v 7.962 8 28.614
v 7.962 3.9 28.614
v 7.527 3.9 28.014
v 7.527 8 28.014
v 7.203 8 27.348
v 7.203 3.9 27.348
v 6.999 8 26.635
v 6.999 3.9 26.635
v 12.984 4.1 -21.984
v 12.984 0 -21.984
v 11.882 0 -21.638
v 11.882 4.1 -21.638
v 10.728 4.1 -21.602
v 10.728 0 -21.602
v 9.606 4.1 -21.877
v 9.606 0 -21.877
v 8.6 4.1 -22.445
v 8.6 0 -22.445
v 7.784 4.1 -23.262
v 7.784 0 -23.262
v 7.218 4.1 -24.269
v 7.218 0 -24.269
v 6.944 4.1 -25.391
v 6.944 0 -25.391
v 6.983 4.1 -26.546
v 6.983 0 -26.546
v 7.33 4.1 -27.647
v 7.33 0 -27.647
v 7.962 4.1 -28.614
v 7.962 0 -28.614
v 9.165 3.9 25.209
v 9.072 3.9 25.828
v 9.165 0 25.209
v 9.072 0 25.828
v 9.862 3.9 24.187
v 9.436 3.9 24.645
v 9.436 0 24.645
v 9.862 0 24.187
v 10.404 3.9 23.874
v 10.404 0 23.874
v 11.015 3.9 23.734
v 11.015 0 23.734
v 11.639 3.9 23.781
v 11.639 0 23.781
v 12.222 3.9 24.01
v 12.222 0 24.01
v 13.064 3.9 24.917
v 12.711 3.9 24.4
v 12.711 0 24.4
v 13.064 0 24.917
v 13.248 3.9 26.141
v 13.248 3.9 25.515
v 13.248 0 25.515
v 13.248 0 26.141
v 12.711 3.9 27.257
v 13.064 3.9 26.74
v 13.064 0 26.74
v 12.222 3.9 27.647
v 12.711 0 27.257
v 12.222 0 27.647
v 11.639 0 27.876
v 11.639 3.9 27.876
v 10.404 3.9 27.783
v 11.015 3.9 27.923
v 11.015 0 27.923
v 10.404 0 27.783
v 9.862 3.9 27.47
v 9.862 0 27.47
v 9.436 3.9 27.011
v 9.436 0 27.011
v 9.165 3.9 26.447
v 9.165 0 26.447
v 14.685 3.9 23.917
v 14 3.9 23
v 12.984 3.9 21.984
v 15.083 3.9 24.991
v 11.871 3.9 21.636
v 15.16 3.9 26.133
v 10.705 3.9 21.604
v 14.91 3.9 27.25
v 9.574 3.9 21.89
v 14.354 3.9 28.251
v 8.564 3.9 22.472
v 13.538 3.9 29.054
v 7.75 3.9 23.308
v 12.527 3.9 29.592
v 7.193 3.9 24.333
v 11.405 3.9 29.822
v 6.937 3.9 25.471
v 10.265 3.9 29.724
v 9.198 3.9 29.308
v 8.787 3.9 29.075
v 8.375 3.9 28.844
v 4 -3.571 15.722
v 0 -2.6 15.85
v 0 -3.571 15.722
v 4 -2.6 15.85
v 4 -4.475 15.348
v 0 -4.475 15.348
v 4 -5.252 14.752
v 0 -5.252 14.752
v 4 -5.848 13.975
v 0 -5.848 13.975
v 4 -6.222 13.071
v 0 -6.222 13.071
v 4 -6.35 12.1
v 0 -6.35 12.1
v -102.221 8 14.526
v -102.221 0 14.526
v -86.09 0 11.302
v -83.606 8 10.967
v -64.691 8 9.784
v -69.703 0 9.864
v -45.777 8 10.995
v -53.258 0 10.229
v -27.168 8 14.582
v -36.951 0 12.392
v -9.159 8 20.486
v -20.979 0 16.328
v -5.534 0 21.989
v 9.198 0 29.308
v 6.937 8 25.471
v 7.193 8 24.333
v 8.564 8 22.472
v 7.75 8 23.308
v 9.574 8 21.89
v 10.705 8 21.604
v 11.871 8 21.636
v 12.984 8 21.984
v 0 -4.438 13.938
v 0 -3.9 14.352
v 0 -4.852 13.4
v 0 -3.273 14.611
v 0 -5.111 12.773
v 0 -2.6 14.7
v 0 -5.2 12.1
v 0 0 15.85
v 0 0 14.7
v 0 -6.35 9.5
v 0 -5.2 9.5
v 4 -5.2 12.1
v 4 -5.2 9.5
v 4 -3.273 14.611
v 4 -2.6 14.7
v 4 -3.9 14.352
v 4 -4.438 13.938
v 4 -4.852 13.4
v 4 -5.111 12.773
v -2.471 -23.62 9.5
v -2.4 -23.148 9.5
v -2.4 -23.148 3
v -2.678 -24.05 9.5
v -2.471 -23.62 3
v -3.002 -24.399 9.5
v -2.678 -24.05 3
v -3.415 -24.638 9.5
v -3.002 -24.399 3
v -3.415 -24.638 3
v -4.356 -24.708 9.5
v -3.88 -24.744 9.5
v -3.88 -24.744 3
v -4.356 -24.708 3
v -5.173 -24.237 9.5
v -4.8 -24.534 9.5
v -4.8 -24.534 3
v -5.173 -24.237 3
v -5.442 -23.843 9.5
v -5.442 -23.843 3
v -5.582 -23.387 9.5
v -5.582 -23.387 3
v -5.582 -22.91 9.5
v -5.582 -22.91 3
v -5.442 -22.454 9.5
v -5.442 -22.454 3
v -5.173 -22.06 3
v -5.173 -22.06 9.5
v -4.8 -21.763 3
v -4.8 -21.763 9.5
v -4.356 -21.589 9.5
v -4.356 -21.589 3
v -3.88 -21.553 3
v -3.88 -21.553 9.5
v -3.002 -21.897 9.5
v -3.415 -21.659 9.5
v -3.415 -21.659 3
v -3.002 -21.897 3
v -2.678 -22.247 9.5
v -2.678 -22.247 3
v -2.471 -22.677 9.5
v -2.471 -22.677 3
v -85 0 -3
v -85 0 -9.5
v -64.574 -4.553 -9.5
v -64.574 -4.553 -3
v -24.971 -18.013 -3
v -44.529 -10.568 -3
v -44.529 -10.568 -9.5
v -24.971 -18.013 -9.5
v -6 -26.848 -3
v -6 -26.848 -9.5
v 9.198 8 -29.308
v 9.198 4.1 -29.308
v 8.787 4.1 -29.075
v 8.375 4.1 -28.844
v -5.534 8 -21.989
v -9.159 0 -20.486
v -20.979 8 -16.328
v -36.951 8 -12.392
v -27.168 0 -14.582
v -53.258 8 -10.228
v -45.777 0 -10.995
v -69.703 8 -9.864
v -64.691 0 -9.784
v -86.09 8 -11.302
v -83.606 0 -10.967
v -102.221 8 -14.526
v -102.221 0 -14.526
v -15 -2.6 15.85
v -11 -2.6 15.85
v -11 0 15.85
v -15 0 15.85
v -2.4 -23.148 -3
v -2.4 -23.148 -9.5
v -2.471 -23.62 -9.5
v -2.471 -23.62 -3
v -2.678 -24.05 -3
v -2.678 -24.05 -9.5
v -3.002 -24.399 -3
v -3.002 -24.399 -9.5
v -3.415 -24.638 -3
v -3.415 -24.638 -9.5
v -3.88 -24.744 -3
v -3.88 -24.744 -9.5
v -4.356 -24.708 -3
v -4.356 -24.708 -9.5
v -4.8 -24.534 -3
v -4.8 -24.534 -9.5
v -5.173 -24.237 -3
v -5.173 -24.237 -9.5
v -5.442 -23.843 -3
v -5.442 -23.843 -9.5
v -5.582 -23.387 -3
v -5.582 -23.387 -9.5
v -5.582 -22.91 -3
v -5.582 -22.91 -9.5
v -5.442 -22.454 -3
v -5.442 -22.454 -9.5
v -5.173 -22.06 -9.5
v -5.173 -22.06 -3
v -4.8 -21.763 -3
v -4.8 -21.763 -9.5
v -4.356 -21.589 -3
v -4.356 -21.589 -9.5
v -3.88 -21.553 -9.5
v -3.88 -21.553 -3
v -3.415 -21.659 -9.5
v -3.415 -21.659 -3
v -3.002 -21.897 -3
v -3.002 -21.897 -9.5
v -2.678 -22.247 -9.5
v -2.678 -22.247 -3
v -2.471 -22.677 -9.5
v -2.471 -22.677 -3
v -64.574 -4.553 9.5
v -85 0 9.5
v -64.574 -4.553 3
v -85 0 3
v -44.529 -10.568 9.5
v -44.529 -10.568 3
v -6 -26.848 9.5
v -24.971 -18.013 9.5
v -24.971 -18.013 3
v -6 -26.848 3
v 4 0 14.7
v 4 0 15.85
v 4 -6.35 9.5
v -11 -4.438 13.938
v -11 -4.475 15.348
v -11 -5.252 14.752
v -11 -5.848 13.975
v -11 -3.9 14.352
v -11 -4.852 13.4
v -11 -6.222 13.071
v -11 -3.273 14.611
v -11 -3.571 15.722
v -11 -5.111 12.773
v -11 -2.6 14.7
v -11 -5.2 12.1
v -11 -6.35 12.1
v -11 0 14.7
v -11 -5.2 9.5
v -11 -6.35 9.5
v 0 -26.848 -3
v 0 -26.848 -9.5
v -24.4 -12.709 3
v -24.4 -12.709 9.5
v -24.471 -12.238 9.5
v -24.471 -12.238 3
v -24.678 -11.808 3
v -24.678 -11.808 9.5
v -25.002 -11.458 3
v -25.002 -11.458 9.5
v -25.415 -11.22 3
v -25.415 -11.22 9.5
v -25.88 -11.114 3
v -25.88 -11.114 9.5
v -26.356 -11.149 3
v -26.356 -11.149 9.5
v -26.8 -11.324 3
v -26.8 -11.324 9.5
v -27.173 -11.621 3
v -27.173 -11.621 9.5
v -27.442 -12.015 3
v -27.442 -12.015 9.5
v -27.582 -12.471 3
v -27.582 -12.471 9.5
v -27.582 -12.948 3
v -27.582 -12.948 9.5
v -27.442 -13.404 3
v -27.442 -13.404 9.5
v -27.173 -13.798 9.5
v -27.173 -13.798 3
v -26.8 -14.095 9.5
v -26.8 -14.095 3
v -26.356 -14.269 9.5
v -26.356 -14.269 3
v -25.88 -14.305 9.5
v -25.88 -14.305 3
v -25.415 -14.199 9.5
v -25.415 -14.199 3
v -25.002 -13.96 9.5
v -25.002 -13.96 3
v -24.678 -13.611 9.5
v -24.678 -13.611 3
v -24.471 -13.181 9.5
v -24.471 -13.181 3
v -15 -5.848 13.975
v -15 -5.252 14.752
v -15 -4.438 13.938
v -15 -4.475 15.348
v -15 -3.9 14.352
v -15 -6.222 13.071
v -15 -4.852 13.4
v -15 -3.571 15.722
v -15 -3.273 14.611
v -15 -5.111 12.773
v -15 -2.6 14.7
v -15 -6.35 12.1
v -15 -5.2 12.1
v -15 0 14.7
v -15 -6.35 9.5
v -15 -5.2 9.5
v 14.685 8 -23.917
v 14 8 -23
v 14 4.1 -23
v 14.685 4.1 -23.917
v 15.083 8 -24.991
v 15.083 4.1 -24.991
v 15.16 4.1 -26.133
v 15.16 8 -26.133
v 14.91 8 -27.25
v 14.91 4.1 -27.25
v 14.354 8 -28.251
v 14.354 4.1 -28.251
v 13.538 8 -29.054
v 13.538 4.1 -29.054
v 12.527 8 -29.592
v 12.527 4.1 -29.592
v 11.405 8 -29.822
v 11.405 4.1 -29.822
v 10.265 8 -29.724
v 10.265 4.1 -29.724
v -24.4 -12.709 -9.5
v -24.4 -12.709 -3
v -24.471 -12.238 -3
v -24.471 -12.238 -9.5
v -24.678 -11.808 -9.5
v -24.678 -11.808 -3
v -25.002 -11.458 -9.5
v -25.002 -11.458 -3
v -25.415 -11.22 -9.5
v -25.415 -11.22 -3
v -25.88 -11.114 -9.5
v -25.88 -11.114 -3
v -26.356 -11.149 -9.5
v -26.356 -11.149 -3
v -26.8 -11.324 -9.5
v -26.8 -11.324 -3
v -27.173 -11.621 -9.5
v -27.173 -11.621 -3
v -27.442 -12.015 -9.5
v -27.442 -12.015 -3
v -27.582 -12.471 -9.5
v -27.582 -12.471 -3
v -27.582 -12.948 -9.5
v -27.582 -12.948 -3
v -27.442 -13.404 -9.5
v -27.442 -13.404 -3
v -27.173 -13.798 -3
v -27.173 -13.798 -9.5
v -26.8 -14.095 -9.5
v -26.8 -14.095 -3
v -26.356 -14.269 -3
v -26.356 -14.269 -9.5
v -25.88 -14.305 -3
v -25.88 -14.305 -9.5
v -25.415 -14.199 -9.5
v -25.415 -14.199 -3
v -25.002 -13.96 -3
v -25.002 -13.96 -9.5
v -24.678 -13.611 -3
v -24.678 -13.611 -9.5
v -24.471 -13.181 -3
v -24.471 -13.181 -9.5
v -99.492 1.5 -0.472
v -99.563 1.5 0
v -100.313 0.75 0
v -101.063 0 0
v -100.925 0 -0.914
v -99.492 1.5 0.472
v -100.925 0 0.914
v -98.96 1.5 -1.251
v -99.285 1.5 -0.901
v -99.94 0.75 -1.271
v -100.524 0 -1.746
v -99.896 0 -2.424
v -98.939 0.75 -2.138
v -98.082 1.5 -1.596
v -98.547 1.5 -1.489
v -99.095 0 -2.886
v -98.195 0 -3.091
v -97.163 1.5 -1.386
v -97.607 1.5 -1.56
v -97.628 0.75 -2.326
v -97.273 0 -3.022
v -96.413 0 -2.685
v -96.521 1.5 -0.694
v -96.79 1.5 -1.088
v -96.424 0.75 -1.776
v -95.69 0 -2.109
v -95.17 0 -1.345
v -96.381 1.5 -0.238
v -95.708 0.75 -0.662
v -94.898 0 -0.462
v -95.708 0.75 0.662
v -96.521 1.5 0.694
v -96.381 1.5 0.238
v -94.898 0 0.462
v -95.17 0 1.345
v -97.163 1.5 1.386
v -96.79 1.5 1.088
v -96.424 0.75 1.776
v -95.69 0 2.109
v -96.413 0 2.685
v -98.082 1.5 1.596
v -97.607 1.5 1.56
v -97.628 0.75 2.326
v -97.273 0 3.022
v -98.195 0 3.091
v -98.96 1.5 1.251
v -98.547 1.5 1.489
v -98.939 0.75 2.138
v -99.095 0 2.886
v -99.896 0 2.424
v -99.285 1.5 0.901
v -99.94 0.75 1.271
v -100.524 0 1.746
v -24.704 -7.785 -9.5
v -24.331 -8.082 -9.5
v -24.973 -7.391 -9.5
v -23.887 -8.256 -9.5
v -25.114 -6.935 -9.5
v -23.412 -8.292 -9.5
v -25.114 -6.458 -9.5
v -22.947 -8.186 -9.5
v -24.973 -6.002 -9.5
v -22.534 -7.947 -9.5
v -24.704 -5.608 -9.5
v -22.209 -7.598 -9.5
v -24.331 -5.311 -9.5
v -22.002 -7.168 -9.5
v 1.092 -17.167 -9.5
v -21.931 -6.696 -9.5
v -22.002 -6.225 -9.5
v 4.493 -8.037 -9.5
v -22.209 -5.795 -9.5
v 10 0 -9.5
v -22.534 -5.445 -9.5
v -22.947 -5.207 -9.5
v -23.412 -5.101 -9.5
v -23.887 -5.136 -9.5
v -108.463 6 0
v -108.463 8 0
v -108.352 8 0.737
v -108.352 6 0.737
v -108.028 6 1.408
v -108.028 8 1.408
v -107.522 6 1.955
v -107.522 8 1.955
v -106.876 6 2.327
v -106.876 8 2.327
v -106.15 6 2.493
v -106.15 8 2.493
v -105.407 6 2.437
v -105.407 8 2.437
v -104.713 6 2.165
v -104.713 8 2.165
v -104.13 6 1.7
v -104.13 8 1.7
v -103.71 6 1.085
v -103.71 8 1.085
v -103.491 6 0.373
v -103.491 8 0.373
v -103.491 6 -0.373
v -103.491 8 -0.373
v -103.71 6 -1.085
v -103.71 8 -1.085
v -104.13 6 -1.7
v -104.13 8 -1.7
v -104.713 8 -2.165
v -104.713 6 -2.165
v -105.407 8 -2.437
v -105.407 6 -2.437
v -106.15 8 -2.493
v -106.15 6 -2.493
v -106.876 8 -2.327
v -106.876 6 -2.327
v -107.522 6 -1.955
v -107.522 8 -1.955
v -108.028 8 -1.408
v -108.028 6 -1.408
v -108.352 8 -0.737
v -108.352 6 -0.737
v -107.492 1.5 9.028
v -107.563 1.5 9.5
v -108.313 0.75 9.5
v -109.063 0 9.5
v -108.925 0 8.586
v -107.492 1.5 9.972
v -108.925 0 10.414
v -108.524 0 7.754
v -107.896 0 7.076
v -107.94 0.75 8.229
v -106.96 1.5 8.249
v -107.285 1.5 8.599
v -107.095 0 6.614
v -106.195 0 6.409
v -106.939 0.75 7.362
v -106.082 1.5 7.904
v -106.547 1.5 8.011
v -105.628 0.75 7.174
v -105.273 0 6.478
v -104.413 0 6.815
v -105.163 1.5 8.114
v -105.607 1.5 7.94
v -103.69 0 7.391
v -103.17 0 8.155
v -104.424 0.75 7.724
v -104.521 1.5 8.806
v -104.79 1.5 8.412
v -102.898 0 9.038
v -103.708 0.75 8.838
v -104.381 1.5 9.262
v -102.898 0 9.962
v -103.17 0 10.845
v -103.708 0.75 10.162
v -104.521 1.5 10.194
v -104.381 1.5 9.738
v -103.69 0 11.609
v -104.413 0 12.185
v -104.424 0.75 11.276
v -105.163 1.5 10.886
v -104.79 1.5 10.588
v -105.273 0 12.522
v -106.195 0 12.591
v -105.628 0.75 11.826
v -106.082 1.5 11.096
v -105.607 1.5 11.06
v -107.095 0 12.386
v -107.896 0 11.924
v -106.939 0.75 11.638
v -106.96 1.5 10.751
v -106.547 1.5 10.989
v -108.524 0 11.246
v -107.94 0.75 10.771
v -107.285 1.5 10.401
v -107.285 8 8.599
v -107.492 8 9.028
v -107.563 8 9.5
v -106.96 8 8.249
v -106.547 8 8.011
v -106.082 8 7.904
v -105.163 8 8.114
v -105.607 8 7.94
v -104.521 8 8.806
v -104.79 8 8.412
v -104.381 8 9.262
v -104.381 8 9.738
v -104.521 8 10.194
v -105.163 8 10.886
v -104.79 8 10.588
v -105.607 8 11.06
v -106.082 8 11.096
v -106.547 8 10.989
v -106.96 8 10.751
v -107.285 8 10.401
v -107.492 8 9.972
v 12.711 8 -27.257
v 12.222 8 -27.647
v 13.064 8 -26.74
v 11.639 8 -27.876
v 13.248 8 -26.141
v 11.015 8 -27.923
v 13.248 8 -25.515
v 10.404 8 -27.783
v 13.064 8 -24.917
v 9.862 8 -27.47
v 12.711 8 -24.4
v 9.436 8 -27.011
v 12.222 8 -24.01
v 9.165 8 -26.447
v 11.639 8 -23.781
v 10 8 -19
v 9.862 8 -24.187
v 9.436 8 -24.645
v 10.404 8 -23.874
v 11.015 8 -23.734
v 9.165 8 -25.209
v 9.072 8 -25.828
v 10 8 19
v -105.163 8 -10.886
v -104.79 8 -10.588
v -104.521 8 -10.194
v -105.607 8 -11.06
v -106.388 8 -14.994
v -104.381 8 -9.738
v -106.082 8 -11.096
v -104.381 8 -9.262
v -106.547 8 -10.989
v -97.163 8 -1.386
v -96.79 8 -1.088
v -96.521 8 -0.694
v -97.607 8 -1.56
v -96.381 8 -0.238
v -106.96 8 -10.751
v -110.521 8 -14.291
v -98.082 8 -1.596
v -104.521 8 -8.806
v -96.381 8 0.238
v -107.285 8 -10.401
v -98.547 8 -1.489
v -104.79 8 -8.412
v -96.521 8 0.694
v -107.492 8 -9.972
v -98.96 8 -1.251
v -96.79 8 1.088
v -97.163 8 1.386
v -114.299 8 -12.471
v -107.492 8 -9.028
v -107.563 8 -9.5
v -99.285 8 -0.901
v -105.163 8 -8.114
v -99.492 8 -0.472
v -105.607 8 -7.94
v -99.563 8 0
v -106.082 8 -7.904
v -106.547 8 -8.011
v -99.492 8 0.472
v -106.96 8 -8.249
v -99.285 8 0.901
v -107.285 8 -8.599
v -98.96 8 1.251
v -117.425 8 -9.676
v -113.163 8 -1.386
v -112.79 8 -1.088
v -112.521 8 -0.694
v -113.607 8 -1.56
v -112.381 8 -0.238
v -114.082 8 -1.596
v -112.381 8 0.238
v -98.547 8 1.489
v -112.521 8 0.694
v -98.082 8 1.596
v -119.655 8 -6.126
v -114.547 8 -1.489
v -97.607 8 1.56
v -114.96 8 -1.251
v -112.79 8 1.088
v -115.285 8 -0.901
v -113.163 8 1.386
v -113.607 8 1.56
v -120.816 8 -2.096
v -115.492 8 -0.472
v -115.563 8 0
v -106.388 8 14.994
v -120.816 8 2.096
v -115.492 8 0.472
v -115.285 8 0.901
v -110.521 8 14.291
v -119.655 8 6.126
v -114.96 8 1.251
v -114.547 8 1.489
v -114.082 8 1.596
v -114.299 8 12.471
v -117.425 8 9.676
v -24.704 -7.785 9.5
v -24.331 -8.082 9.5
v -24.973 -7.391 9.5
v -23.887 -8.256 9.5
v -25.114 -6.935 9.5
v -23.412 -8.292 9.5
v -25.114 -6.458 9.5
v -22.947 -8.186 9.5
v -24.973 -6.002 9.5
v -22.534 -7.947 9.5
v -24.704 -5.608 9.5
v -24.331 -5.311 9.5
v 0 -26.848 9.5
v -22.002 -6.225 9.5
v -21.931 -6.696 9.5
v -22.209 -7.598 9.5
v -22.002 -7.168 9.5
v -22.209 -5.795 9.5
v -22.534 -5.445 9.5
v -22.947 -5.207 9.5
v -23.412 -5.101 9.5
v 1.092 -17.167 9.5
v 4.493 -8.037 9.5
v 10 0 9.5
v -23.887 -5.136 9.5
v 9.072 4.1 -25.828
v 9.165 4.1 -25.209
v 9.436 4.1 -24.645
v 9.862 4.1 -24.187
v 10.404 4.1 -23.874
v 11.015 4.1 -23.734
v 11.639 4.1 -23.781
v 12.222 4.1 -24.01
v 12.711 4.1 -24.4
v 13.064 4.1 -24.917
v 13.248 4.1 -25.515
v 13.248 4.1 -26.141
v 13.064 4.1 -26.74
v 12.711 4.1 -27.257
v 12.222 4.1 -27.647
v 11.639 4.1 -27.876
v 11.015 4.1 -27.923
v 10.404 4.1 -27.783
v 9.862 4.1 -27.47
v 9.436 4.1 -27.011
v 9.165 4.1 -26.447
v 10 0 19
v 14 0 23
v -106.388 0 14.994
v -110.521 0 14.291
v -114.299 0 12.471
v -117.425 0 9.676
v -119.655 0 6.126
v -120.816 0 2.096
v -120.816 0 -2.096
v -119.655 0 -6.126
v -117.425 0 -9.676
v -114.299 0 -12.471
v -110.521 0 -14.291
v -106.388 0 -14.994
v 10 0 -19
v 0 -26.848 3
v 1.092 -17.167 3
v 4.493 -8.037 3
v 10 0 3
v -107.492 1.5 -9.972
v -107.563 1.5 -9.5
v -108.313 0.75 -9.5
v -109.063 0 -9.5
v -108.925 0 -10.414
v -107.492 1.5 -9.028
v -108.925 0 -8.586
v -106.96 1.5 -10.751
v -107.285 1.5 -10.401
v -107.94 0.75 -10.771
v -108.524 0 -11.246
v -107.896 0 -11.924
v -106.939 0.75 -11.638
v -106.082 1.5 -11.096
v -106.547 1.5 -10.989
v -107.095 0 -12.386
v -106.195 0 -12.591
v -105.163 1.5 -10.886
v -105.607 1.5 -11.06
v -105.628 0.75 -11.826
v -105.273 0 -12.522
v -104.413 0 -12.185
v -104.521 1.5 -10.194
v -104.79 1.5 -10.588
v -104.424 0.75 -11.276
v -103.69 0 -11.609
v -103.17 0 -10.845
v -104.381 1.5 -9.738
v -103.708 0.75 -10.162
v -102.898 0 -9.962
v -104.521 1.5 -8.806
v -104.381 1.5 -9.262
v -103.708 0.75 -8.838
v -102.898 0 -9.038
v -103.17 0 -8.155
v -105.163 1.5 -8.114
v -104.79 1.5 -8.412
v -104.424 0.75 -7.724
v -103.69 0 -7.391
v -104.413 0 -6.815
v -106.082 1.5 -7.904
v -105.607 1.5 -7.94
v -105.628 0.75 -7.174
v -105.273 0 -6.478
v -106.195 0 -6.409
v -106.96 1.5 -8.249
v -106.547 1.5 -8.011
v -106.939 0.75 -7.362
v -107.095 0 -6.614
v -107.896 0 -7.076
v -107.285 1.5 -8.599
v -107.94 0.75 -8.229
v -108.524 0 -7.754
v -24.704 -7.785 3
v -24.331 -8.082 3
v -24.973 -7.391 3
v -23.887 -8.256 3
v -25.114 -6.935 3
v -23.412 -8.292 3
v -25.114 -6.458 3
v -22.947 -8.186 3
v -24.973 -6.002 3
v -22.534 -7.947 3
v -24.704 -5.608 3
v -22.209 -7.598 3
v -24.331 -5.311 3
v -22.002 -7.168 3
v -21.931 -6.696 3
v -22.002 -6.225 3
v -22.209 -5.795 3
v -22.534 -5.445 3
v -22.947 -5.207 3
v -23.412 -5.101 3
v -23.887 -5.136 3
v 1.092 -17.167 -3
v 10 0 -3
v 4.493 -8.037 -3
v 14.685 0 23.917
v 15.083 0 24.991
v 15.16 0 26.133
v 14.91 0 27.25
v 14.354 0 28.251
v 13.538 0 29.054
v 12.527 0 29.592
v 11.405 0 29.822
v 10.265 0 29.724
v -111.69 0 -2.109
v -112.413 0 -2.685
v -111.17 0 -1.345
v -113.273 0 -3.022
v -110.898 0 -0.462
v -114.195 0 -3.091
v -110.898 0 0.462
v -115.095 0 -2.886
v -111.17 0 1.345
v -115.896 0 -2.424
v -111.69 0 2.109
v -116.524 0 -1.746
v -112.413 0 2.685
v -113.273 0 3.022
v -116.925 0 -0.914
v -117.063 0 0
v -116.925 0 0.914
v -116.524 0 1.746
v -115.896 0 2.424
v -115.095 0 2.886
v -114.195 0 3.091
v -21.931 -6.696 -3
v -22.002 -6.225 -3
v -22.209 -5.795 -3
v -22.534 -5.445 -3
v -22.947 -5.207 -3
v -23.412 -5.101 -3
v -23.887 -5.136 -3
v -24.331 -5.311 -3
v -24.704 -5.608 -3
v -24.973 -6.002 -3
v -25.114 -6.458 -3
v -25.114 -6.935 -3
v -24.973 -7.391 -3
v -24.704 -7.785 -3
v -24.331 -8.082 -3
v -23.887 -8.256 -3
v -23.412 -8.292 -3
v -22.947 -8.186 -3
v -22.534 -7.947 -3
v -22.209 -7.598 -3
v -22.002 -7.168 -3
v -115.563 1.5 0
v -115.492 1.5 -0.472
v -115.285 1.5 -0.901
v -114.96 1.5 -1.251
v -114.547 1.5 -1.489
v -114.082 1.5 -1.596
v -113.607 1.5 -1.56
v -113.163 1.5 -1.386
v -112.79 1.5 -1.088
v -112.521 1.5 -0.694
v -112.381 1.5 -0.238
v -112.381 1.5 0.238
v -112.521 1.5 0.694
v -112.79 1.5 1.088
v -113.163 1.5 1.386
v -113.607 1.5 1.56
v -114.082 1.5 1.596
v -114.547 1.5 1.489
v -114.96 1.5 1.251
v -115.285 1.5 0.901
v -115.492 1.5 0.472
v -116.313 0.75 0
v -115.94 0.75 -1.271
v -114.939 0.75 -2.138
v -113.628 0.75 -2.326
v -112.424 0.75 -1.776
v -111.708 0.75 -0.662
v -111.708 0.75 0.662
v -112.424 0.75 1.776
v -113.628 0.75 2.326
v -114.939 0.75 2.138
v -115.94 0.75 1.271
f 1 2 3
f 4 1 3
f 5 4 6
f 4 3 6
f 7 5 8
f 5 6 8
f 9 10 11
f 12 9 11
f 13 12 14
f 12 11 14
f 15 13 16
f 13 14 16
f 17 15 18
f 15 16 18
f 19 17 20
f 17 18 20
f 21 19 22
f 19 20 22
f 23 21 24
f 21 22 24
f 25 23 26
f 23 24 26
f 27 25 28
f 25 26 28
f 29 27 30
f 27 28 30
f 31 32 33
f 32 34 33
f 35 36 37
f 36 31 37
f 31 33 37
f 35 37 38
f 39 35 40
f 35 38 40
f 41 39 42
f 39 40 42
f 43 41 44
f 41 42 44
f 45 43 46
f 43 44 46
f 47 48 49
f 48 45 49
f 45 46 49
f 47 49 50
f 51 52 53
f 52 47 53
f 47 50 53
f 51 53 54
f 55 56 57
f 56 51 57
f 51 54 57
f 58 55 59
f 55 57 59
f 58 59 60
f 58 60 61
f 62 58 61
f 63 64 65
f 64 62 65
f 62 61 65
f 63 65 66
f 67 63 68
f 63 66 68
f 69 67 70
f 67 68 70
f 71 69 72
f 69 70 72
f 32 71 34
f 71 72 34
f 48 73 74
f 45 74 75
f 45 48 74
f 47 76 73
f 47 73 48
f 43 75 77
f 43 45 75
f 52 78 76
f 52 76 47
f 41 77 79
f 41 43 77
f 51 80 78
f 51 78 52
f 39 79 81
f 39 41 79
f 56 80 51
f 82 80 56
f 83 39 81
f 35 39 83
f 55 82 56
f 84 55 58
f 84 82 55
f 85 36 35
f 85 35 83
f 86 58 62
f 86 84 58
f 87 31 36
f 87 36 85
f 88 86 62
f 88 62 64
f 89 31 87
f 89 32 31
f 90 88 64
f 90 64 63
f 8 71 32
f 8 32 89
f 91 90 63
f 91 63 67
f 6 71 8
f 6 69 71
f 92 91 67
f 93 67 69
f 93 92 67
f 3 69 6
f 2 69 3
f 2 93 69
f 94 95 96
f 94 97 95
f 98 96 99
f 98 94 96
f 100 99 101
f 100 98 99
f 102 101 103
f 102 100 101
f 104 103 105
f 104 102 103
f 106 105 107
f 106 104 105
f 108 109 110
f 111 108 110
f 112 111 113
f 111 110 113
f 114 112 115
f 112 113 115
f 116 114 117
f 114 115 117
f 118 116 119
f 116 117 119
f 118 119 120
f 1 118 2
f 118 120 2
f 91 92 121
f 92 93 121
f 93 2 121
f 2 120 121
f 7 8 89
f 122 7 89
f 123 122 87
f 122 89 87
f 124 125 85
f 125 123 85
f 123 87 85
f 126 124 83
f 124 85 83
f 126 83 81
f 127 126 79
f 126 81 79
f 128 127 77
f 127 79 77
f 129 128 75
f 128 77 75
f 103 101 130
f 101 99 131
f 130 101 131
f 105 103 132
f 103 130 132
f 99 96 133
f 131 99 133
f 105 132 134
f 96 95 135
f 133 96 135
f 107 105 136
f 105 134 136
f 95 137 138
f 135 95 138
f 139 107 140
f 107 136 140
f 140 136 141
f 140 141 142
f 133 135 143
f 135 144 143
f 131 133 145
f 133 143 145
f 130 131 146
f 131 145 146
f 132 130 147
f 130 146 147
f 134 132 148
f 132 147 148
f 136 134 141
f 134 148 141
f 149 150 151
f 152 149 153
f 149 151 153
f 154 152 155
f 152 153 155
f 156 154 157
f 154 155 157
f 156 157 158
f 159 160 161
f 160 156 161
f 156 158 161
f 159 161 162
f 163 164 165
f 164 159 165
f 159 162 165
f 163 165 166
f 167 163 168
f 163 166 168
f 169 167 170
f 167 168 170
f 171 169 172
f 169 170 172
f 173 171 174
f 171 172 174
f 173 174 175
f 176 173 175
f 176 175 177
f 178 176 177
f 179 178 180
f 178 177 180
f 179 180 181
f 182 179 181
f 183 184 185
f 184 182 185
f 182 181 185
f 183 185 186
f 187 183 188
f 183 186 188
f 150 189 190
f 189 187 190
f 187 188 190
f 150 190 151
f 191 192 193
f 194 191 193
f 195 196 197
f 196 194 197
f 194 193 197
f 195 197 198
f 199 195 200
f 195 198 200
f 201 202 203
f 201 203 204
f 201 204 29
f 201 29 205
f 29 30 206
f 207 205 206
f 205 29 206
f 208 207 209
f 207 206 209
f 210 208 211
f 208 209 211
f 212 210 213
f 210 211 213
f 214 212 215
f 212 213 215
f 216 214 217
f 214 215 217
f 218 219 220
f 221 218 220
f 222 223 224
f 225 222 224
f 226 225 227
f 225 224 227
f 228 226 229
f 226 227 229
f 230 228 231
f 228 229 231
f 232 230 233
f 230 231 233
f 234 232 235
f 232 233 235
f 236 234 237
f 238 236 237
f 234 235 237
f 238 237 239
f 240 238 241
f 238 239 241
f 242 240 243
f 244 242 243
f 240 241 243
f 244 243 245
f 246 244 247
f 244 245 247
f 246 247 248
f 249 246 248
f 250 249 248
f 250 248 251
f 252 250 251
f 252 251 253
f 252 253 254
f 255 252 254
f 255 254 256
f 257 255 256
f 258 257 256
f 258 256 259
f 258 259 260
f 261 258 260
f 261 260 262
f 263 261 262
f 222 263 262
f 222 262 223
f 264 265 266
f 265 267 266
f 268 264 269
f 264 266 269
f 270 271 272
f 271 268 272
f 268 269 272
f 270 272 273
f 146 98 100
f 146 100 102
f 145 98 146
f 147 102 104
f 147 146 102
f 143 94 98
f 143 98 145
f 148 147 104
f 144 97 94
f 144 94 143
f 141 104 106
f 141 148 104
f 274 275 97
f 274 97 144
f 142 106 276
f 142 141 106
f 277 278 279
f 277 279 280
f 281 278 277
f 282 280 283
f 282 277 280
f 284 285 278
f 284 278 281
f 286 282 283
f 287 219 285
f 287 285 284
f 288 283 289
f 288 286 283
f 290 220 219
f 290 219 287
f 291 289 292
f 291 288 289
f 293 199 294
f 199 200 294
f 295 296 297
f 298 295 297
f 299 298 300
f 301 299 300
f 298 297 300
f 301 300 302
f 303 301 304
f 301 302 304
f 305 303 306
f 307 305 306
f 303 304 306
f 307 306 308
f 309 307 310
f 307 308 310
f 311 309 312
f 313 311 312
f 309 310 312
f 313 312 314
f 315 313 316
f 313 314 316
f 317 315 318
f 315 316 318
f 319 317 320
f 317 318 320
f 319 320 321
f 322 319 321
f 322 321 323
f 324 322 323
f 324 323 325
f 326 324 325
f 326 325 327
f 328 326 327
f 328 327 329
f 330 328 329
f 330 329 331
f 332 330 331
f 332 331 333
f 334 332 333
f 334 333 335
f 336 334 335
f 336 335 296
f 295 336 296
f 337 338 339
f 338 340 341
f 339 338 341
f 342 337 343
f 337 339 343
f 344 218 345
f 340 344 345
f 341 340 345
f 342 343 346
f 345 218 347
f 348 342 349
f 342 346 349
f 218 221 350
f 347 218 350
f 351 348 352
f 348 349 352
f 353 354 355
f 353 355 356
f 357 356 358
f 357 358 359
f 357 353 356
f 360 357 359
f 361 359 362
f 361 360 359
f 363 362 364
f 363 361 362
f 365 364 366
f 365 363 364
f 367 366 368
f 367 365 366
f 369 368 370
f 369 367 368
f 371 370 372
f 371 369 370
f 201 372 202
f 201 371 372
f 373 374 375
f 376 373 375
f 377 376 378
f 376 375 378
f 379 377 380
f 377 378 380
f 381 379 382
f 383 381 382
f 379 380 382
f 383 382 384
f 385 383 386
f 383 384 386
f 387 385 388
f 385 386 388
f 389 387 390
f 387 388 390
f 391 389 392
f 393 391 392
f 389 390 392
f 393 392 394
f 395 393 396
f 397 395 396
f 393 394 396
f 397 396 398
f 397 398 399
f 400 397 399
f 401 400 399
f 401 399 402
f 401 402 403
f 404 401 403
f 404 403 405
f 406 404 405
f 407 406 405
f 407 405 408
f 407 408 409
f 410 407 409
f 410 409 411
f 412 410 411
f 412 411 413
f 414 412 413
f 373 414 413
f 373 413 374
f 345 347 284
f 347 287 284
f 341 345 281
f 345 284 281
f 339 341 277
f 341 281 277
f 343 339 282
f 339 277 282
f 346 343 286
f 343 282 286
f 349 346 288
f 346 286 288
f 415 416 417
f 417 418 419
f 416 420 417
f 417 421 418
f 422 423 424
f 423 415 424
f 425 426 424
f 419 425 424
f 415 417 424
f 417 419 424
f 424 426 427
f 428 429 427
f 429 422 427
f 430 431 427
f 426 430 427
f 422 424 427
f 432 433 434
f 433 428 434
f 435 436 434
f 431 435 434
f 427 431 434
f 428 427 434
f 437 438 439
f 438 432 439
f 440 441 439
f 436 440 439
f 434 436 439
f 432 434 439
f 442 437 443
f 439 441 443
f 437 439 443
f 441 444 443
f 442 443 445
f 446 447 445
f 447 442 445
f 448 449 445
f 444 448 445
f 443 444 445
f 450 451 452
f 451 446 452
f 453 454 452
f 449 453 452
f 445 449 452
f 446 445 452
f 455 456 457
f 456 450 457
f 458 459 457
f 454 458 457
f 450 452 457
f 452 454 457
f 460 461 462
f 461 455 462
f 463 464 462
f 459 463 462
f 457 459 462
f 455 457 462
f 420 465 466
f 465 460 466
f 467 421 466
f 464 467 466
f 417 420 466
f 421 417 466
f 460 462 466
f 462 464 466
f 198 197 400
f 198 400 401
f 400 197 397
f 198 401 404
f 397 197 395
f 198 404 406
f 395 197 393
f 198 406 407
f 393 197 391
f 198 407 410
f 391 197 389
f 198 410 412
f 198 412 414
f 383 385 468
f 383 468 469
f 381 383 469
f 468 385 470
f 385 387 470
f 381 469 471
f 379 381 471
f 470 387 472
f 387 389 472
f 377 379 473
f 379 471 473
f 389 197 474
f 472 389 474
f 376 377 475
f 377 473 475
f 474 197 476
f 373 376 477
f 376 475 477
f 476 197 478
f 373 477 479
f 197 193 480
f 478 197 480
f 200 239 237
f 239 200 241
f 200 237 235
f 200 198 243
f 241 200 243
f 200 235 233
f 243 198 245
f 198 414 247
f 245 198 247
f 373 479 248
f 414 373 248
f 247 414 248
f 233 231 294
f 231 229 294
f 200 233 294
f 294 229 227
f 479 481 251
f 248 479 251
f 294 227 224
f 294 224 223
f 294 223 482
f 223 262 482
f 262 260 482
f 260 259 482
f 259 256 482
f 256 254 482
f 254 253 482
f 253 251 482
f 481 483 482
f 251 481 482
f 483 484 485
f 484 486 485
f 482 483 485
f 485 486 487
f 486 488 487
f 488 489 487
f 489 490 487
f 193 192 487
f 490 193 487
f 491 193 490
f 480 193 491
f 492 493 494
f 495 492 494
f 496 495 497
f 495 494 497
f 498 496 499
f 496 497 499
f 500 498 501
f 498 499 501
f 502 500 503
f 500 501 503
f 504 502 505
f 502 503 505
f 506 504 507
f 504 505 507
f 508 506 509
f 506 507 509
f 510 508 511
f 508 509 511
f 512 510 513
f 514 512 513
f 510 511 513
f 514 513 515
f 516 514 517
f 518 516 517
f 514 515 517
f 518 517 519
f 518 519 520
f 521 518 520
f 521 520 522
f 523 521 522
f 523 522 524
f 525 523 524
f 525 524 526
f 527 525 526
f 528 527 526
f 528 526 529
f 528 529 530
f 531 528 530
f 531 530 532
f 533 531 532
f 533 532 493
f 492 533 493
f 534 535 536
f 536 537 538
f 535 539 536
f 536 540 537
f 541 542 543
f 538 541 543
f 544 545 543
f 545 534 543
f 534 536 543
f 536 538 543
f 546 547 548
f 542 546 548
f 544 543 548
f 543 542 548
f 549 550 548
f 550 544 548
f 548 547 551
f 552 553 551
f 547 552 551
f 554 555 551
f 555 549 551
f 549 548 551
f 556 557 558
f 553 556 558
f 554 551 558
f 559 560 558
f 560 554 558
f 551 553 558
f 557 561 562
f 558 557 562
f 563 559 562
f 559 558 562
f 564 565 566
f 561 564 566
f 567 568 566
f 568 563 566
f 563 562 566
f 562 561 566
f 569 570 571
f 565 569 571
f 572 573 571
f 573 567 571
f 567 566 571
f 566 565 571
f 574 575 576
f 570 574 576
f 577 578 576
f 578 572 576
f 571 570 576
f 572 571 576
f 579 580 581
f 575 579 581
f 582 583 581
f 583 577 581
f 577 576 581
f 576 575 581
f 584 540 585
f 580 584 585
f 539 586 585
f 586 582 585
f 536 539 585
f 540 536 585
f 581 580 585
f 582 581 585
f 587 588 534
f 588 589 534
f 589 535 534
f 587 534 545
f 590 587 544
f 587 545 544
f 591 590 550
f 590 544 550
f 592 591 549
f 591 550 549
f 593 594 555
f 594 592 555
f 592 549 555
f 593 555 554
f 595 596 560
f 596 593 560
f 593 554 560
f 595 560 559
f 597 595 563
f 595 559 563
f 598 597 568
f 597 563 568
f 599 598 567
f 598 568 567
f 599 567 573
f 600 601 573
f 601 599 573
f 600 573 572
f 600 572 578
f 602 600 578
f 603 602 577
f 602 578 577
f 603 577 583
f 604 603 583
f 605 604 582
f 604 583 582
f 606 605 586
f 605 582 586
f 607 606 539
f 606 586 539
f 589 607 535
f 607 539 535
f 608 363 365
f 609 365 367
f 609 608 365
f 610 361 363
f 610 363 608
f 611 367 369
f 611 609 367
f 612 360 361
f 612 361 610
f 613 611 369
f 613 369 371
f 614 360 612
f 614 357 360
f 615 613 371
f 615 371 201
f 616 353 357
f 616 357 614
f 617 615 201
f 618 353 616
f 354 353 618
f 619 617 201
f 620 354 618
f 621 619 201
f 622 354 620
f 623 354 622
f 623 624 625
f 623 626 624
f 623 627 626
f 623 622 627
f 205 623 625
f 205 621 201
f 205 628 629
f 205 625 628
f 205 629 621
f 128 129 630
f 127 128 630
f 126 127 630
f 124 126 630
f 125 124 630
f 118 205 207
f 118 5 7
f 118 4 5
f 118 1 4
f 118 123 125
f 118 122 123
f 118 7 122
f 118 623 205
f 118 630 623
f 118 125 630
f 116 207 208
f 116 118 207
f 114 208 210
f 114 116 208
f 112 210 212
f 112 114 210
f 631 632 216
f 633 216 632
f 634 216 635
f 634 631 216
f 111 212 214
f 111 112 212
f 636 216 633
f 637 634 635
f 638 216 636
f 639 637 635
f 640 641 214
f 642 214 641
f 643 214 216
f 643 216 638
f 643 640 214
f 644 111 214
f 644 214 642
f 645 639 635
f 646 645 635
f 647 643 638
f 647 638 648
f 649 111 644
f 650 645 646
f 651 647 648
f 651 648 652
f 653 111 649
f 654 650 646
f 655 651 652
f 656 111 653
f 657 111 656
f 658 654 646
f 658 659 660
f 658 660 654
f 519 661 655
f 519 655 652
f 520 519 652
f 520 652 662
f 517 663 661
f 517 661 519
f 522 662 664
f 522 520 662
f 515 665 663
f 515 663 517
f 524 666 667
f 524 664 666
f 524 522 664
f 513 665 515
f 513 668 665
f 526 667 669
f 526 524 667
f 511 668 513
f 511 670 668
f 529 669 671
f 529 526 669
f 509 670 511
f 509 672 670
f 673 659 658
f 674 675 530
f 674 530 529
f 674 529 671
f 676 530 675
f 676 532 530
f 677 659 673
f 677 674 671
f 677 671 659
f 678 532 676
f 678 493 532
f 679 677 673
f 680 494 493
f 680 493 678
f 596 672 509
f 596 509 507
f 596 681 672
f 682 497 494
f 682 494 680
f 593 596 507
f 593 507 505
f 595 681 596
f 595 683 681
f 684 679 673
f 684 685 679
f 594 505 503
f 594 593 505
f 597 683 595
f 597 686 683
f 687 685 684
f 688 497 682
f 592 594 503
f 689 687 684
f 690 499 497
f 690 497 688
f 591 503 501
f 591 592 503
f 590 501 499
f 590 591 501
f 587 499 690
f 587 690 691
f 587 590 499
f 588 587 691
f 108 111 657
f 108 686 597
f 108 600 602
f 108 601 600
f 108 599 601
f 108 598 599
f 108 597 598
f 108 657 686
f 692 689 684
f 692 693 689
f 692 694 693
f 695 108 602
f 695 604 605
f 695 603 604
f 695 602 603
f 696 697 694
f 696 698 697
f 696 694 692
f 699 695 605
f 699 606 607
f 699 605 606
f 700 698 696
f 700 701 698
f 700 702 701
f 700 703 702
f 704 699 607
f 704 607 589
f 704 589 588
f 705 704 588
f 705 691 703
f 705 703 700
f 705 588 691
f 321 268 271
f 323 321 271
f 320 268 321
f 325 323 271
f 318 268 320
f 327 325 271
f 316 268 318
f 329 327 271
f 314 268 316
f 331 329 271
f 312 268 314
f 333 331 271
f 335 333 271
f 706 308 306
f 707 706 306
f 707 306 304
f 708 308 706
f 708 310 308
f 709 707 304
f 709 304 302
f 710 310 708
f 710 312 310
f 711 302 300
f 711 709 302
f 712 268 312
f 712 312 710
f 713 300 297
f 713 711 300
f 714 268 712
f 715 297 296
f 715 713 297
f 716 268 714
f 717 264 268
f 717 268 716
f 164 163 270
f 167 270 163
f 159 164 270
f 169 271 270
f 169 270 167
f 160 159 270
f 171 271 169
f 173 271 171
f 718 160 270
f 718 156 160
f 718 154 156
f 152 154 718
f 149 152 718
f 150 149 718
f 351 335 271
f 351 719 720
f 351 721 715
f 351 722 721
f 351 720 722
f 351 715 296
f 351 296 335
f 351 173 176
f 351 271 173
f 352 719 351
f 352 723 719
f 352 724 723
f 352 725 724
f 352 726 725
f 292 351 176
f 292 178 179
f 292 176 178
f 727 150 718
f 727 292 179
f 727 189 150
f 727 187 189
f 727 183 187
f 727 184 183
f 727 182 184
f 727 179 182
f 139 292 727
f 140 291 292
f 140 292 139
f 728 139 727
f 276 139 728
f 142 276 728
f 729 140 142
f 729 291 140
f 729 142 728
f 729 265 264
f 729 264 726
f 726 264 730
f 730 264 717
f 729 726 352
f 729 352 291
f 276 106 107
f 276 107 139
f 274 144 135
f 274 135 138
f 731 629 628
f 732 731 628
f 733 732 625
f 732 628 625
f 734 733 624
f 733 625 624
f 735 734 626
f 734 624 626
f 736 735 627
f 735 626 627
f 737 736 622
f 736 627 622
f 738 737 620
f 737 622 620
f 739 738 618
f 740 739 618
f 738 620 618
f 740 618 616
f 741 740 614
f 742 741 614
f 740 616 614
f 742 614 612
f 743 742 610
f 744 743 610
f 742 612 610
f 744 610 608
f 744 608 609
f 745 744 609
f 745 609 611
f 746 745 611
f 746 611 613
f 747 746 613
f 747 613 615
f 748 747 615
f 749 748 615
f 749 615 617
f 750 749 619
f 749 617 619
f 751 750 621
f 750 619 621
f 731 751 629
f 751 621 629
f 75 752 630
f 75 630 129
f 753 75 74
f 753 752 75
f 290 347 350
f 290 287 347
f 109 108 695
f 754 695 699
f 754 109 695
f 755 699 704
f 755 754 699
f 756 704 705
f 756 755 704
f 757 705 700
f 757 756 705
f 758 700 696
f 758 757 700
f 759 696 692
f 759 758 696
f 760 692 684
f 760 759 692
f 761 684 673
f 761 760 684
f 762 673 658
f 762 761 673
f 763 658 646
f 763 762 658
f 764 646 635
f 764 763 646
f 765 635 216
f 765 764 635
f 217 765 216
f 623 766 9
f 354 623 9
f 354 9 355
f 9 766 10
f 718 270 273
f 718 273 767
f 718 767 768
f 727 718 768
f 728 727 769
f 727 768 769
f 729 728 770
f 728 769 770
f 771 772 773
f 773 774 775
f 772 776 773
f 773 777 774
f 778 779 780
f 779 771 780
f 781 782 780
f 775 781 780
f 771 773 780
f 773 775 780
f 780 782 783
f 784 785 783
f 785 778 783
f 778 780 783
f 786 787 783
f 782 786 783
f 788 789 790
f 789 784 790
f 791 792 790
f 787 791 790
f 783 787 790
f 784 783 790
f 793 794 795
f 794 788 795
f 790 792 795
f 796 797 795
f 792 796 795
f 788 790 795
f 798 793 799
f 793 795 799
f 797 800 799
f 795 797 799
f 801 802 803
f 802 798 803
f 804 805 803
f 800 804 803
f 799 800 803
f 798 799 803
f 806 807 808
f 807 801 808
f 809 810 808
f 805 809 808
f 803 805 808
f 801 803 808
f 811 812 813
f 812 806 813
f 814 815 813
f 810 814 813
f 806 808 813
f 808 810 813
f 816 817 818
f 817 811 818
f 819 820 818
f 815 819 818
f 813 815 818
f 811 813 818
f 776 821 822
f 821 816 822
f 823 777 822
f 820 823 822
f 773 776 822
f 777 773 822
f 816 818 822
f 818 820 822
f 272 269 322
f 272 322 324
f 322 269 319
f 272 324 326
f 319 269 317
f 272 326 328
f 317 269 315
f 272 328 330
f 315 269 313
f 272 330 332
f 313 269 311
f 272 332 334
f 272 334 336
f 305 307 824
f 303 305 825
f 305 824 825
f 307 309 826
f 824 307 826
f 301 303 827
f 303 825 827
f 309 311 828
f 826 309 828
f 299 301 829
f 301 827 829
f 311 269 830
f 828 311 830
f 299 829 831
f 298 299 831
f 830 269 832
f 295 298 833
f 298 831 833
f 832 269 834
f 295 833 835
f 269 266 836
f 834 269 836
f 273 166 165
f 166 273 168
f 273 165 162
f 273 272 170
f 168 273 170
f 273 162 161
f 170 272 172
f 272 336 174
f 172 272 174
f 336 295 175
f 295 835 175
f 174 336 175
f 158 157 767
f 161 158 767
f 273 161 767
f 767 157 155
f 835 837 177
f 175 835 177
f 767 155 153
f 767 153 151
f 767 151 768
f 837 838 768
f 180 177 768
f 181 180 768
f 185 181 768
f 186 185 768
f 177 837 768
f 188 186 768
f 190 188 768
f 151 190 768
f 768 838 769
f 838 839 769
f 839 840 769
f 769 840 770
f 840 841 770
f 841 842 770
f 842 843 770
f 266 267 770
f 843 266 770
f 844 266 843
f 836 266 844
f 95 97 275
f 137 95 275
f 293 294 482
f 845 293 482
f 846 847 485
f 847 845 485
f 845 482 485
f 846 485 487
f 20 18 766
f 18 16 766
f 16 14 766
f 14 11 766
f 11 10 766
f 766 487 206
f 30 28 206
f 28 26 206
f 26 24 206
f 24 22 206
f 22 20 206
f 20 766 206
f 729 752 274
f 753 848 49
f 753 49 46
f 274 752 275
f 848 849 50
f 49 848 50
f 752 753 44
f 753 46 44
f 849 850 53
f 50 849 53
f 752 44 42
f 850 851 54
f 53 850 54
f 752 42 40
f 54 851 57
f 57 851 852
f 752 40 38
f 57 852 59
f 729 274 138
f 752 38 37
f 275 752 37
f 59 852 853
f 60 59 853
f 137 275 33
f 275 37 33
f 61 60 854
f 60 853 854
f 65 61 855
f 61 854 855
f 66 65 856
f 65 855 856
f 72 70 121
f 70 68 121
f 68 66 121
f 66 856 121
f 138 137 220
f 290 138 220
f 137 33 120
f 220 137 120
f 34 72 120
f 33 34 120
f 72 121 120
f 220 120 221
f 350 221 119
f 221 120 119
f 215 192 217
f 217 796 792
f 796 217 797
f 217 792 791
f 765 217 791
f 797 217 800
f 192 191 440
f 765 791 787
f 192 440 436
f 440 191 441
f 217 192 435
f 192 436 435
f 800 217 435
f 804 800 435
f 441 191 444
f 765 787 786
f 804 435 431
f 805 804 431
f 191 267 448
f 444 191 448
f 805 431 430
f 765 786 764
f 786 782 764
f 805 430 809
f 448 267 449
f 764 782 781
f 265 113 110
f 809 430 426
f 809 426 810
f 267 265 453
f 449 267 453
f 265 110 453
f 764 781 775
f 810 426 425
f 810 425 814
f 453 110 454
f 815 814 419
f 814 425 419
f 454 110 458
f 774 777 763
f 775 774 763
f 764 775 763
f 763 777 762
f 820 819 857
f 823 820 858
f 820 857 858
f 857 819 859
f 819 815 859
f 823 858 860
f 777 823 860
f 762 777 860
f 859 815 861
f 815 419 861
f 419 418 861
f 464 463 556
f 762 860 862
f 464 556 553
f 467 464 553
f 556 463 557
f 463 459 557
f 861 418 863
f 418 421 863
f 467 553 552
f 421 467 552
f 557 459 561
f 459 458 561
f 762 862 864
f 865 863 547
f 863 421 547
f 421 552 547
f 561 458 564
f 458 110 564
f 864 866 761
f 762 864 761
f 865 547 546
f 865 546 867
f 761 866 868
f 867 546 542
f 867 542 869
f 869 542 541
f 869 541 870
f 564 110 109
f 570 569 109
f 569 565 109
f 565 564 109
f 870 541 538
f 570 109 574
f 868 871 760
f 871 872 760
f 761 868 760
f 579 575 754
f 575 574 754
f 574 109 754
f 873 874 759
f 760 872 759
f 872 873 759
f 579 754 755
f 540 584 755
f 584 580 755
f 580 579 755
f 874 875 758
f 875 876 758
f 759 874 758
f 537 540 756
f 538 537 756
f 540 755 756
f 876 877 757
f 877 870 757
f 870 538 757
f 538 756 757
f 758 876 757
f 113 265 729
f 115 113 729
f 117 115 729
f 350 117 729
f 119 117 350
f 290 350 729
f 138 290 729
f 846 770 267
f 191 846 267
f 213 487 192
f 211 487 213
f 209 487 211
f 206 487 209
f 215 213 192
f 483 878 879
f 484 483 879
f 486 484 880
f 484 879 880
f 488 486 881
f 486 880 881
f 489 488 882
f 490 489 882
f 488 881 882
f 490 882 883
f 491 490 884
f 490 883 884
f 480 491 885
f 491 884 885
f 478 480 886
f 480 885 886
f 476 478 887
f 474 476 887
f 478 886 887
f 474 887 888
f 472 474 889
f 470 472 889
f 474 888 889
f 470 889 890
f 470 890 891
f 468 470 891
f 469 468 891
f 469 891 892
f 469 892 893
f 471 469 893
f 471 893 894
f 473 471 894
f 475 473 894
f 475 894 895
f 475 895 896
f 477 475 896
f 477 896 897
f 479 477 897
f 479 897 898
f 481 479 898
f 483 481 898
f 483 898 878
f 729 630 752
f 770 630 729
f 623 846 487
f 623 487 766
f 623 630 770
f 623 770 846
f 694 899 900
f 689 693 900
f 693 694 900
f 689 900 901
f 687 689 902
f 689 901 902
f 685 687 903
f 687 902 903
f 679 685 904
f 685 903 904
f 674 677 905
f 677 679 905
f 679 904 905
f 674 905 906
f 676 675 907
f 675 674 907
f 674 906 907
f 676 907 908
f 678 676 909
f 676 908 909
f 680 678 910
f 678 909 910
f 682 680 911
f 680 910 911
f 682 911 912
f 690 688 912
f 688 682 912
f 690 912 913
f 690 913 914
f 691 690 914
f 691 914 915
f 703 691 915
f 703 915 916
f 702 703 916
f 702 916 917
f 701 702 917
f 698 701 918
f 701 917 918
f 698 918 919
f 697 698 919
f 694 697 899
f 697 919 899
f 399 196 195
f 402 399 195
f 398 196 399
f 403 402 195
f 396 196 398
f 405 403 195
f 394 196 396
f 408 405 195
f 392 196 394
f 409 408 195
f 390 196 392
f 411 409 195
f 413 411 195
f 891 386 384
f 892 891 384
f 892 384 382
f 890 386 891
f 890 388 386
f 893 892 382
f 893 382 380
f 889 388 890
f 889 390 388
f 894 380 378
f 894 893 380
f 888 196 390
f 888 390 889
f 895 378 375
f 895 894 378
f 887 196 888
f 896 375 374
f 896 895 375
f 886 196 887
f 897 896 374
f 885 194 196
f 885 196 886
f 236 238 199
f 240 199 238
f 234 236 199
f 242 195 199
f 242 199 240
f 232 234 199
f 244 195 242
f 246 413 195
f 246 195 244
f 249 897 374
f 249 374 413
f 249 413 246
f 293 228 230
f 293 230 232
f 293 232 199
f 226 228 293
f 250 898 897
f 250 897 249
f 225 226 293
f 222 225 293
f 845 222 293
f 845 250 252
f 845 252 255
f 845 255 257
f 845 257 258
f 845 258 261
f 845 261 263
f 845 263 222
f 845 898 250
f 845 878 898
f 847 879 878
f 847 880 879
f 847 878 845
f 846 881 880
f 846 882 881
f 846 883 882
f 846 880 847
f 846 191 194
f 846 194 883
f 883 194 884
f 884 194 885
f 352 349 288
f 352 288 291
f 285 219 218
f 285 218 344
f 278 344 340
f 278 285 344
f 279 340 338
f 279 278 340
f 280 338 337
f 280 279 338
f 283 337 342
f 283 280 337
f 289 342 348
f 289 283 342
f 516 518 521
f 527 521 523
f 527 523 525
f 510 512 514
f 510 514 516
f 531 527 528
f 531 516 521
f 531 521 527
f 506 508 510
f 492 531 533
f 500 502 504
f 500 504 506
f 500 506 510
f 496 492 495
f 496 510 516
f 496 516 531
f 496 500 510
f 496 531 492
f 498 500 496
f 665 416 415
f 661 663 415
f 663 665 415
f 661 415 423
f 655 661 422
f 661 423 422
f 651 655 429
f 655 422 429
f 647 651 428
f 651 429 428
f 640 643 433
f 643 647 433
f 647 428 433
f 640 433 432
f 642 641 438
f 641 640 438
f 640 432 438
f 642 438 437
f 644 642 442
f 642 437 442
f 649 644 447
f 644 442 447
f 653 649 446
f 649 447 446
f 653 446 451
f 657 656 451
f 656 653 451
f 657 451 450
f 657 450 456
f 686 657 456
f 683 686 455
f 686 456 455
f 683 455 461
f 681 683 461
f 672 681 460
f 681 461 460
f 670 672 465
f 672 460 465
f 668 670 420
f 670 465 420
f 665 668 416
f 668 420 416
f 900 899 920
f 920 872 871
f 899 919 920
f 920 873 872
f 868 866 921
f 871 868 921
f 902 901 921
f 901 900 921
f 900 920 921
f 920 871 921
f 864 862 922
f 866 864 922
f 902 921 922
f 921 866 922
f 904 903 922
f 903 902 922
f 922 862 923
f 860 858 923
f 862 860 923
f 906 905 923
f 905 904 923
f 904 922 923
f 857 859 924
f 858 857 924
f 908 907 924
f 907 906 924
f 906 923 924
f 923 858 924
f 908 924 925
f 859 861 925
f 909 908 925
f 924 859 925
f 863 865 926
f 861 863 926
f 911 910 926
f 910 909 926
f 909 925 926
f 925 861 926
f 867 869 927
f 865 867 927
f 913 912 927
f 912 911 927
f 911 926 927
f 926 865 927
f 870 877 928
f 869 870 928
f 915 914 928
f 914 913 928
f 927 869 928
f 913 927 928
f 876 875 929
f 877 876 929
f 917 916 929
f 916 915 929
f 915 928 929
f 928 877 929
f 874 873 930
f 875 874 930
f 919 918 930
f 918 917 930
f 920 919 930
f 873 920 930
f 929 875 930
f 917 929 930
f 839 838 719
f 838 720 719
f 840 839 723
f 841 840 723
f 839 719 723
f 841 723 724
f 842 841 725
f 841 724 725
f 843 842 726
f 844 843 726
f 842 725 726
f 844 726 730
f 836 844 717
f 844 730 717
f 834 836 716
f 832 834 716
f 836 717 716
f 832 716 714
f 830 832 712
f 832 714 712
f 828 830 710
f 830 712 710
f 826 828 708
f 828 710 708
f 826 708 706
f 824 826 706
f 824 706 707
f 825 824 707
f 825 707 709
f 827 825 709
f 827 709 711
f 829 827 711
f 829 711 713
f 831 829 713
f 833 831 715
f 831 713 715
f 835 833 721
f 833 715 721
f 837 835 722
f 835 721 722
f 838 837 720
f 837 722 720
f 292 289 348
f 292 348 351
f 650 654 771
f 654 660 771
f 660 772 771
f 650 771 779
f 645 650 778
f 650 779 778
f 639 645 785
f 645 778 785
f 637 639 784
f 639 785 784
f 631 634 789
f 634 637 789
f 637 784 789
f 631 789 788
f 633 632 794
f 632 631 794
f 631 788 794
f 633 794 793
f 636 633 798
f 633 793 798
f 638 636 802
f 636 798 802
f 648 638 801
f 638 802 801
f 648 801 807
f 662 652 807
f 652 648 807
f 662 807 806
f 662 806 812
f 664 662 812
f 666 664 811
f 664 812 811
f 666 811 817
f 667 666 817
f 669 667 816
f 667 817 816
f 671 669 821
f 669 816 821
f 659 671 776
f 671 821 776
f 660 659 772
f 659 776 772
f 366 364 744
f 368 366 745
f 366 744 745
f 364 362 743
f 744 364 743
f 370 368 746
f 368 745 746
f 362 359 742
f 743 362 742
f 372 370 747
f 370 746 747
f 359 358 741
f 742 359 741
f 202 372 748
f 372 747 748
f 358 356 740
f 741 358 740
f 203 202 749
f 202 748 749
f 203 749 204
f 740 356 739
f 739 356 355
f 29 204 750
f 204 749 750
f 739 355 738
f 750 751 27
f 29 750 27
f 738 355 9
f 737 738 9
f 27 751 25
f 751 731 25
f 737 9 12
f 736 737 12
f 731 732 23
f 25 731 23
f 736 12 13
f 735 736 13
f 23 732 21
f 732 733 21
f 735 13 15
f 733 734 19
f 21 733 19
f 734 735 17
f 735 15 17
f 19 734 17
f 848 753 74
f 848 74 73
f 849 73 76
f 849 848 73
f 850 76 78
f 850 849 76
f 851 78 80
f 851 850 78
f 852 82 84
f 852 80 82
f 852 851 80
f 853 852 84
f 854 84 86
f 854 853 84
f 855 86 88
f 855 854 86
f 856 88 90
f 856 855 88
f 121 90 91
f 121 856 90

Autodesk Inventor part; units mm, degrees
ref_plane "YZ Plane" through (0, 0, 0) normal (1, 0, 0) x (0, 1, 0)
ref_plane "XZ Plane" through (0, 0, 0) normal (0, 1, 0) x (-1, 0, 0)
ref_plane "XY Plane" through (0, 0, 0) normal (0, 0, 1) x (1, 0, 0)
sketch "Sketch1" plane through (0, 0, 0) normal (0, 1, 0) x (-1, 0, 0)
  line L0 (0, 0) -> (105.9629, 0) construction
  line L1 (105.9629, 0) -> (105.9629, -9.5) construction
  circle A0 centre (105.9629, -9.5) radius 1.6
  circle A1 centre (113.9629, 0) radius 1.6
  circle A2 centre (105.9629, -9.5) radius 1.6
  circle A3 centre (97.9629, 0) radius 1.6
  circle A4 centre (105.9629, 9.5) radius 1.6
  circle A5 centre (105.9629, 0) radius 15
  circle A6 centre (105.9629, 0) radius 2.5
  line L2 (3, -40) -> (-37, 0) construction
  line L3 (-7.5, -16.5) -> (-14, -23)
  circle A7 centre (-11.1716, -25.8284) radius 4
  circle A8 centre (-11.1716, -25.8284) radius 2.1
  arc A9 (102.2211, -14.5258) -> (-9.1982, -29.3078) centre (64.8022, -159.7836) ccw
  line L4 (3, 40) -> (-37, 0) construction
  line L5 (-7.5, 16.5) -> (-14, 23)
  circle A10 centre (-11.1716, 25.8284) radius 4
  circle A11 centre (-11.1716, 25.8284) radius 2.1
  arc A12 (-9.1982, 29.3078) -> (102.2211, 14.5258) centre (64.8022, 159.7836) ccw
  line L6 (-10, 19) -> (-10, -19)
  arc A13 (-12.9845, 21.9845) -> (-6.9989, 26.6354) centre (-11.1716, 25.8284) ccw
  arc A14 (-7.9621, -28.6144) -> (-12.9845, -21.9845) centre (-11.1716, -25.8284) ccw
  arc A15 (-6.9989, 26.6354) -> (-7.9621, 28.6144) centre (-11.1716, 25.8284) ccw
  point P0 (-16.1526, 27.519)
  point P1 (-14, -23)
  point P2 (102.2211, 14.5258)
  point P3 (-14, 23)
  point P4 (-10, 0)
  point P5 (-12.9845, -21.9845)
  dimension "d5" = 30
  dimension "d67" = 8
  dimension "d1" = 9.5
  dimension "d2" = 3.2
  dimension "d3" = 3.2
  dimension "d4" = 8
  dimension "d55" = 5
  dimension "d68" = 4
  dimension "d69" = 4.2
  dimension "d70" = 150
  dimension "d82" = 10
  dimension "d84" = 38
  dimension "d85" = 105.963
  dimension "d86" = 4.25
extrude "Extrusion1" add sketch "Sketch1" along normal blind 8 contours A5 | A5 A9 A14 L3 L6 L5 A13 A15 A12 | A6
extrude "Extrusion2" add sketch "Sketch1" along normal blind 3.9 contours A15 A13 L5 A10 A12 | A10
extrude "Extrusion3" add sketch "Sketch1" against normal blind 3.9 from surface at 8 contours A9 A7 L3 A14 | A7
extrude "Extrusion9" cut sketch "Sketch1" against normal blind 2 from surface at 8 contours A6
sketch "Sketch2" plane through (0, 0, 0) normal (0, 0, 1) x (1, 0, 0)
  line L0 (0, 0) -> (-3, 0) projected
  line L1 (0, 0) -> (0, -30)
  line L2 (-98.8932, 0) -> (-6, 0) projected
  arc A0 (0, -30) -> (-85, 0) centre (-137.8451, -285.1445) ccw
  line L3 (-6, -26.8484) -> (0, -26.8484)
  line L4 (0, 0) -> (-85, 0)
  line L5 (0, -23.1484) -> (-13.5147, -23.1484) construction
  circle A1 centre (-4, -23.1484) radius 1.6
  arc A2 (10, 0) -> (0, -26.8484) centre (39.9981, -26.4597) ccw
  line L6 (10, 0) -> (0, 0)
  line L7 (12.9845, 8) -> (10, 8) projected
  point P0 (0, -15)
  point P1 (-3, 0)
  point P2 (-6, 0)
  point P3 (-85, 0)
  point P4 (12.622, 8)
  point P5 (0, 8)
  point P6 (0, -26.0709)
  point P7 (14, 8)
  point P8 (12.7592, 8)
  dimension "d16" = 290
  dimension "d17" = 85
  dimension "d18" = 6
  dimension "d19" = 30
  dimension "d63" = 3.7
  dimension "d64" = 3.2
  dimension "d65" = 4
  dimension "d79" = 10
  dimension "d80" = 40
extrude "Extrusion4" add sketch "Sketch2" along normal mid plane 19 contours L6 A2 L3 A0 L2 L4 L0
extrude "Extrusion11" cut sketch "Sketch2" along normal mid plane 6 contours L6 A2 L3 A0 L2 L4 L0 | A1
sketch "Sketch9" plane through (0, 0, 9.5) normal (0, 0, 1) x (1, 0, 0)
  circle A0 centre (-26, -12.7093) radius 1.6
  arc A1 (-6, -26.8484) -> (-85, 0) centre (-137.8451, -285.1445) ccw projected
  line L0 (0, -26.8484) -> (0, 0) projected
  line L1 (-137.8451, -285.1445) -> (-26, -12.7093) construction
  line L2 (-26, -12.7093) -> (-21.4388, -1.5991) construction
  circle A2 centre (-23.5314, -6.6963) radius 1.6
  line L3 (0, 0) -> (0, -45) construction
  point P0 (0, -13.4242)
  dimension "d71" = 3.2
  dimension "d72" = 294.5
  dimension "d73" = 26
  dimension "d75" = 3.2
  dimension "d76" = 6.5
extrude "Extrusion12" cut sketch "Sketch9" against normal through all
sketch "Sketch10" plane through (10, 0, -19) normal (1, 0, 0) x (0, 0, -1)
  line L0 (-38, 0) -> (-28.5, 0) projected
  line L1 (-28.5, 0) -> (-28.5, -7)
  line L2 (-28.5, -26.8484) -> (-28.5, 0) projected
  line L3 (-28.5, 0) -> (-37.25, 0)
  circle A0 centre (-31.1, -2.6) radius 2.6
  arc A1 (-34.85, -2.6) -> (-31.1, -6.35) centre (-31.1, -2.6) ccw
  line L4 (-34.85, -2.6) -> (-34.85, 0)
  line L5 (-31.1, -6.35) -> (-28.5, -6.35)
  line L6 (-31.1, -5.2) -> (-28.5, -5.2)
  line L7 (-33.7, -2.6) -> (-33.7, 0)
  arc A2 (-28.5, -5.3023) -> (-33.8023, 0) centre (-31.1, -2.6) ccw
  arc A3 (-31.1, -6.35) -> (-28.5, -5.3023) centre (-31.1, -2.6) ccw construction
  point P0 (-19, 0)
  point P1 (-33.7, 0)
  point P2 (-34.85, 0)
  point P3 (-32.4068, -0.3523)
  point P4 (-31.1, 0)
  point P5 (-28.5, -2.6)
  point P6 (-31.1, 0)
  dimension "d101" = 5.2
  dimension "d102" = 7.5
extrude "Extrusion16" add sketch "Sketch10" against normal blind 25 contours L0 L7 A0 L6 L1 L5 A1 L4
extrude "Extrusion17" cut sketch "Sketch10" against normal blind 21 contours L0 L7 A0 L6 L1 L5 A1 L4 | L0 A0 L7 | L0 L1 A0 | L6 A0 L1
extrude "Extrusion18" add sketch "Sketch10" against normal blind 10 contours L0 L7 A0 L6 L1 L5 A1 L4
extrude "Extrusion19" cut sketch "Sketch10" against normal blind 6 contours L0 L7 A0 L6 L1 L5 A1 L4 | L0 A0 L7 | L0 L1 A0 | L6 A0 L1
chamfer "Chamfer1" distance 1.5 angle 45 4 edges at (-104.3629, 0, 9.5) (-96.3629, 0, 0) (-112.3629, 0, 0) (-104.3629, 0, -9.5)
properties part number "brat"
